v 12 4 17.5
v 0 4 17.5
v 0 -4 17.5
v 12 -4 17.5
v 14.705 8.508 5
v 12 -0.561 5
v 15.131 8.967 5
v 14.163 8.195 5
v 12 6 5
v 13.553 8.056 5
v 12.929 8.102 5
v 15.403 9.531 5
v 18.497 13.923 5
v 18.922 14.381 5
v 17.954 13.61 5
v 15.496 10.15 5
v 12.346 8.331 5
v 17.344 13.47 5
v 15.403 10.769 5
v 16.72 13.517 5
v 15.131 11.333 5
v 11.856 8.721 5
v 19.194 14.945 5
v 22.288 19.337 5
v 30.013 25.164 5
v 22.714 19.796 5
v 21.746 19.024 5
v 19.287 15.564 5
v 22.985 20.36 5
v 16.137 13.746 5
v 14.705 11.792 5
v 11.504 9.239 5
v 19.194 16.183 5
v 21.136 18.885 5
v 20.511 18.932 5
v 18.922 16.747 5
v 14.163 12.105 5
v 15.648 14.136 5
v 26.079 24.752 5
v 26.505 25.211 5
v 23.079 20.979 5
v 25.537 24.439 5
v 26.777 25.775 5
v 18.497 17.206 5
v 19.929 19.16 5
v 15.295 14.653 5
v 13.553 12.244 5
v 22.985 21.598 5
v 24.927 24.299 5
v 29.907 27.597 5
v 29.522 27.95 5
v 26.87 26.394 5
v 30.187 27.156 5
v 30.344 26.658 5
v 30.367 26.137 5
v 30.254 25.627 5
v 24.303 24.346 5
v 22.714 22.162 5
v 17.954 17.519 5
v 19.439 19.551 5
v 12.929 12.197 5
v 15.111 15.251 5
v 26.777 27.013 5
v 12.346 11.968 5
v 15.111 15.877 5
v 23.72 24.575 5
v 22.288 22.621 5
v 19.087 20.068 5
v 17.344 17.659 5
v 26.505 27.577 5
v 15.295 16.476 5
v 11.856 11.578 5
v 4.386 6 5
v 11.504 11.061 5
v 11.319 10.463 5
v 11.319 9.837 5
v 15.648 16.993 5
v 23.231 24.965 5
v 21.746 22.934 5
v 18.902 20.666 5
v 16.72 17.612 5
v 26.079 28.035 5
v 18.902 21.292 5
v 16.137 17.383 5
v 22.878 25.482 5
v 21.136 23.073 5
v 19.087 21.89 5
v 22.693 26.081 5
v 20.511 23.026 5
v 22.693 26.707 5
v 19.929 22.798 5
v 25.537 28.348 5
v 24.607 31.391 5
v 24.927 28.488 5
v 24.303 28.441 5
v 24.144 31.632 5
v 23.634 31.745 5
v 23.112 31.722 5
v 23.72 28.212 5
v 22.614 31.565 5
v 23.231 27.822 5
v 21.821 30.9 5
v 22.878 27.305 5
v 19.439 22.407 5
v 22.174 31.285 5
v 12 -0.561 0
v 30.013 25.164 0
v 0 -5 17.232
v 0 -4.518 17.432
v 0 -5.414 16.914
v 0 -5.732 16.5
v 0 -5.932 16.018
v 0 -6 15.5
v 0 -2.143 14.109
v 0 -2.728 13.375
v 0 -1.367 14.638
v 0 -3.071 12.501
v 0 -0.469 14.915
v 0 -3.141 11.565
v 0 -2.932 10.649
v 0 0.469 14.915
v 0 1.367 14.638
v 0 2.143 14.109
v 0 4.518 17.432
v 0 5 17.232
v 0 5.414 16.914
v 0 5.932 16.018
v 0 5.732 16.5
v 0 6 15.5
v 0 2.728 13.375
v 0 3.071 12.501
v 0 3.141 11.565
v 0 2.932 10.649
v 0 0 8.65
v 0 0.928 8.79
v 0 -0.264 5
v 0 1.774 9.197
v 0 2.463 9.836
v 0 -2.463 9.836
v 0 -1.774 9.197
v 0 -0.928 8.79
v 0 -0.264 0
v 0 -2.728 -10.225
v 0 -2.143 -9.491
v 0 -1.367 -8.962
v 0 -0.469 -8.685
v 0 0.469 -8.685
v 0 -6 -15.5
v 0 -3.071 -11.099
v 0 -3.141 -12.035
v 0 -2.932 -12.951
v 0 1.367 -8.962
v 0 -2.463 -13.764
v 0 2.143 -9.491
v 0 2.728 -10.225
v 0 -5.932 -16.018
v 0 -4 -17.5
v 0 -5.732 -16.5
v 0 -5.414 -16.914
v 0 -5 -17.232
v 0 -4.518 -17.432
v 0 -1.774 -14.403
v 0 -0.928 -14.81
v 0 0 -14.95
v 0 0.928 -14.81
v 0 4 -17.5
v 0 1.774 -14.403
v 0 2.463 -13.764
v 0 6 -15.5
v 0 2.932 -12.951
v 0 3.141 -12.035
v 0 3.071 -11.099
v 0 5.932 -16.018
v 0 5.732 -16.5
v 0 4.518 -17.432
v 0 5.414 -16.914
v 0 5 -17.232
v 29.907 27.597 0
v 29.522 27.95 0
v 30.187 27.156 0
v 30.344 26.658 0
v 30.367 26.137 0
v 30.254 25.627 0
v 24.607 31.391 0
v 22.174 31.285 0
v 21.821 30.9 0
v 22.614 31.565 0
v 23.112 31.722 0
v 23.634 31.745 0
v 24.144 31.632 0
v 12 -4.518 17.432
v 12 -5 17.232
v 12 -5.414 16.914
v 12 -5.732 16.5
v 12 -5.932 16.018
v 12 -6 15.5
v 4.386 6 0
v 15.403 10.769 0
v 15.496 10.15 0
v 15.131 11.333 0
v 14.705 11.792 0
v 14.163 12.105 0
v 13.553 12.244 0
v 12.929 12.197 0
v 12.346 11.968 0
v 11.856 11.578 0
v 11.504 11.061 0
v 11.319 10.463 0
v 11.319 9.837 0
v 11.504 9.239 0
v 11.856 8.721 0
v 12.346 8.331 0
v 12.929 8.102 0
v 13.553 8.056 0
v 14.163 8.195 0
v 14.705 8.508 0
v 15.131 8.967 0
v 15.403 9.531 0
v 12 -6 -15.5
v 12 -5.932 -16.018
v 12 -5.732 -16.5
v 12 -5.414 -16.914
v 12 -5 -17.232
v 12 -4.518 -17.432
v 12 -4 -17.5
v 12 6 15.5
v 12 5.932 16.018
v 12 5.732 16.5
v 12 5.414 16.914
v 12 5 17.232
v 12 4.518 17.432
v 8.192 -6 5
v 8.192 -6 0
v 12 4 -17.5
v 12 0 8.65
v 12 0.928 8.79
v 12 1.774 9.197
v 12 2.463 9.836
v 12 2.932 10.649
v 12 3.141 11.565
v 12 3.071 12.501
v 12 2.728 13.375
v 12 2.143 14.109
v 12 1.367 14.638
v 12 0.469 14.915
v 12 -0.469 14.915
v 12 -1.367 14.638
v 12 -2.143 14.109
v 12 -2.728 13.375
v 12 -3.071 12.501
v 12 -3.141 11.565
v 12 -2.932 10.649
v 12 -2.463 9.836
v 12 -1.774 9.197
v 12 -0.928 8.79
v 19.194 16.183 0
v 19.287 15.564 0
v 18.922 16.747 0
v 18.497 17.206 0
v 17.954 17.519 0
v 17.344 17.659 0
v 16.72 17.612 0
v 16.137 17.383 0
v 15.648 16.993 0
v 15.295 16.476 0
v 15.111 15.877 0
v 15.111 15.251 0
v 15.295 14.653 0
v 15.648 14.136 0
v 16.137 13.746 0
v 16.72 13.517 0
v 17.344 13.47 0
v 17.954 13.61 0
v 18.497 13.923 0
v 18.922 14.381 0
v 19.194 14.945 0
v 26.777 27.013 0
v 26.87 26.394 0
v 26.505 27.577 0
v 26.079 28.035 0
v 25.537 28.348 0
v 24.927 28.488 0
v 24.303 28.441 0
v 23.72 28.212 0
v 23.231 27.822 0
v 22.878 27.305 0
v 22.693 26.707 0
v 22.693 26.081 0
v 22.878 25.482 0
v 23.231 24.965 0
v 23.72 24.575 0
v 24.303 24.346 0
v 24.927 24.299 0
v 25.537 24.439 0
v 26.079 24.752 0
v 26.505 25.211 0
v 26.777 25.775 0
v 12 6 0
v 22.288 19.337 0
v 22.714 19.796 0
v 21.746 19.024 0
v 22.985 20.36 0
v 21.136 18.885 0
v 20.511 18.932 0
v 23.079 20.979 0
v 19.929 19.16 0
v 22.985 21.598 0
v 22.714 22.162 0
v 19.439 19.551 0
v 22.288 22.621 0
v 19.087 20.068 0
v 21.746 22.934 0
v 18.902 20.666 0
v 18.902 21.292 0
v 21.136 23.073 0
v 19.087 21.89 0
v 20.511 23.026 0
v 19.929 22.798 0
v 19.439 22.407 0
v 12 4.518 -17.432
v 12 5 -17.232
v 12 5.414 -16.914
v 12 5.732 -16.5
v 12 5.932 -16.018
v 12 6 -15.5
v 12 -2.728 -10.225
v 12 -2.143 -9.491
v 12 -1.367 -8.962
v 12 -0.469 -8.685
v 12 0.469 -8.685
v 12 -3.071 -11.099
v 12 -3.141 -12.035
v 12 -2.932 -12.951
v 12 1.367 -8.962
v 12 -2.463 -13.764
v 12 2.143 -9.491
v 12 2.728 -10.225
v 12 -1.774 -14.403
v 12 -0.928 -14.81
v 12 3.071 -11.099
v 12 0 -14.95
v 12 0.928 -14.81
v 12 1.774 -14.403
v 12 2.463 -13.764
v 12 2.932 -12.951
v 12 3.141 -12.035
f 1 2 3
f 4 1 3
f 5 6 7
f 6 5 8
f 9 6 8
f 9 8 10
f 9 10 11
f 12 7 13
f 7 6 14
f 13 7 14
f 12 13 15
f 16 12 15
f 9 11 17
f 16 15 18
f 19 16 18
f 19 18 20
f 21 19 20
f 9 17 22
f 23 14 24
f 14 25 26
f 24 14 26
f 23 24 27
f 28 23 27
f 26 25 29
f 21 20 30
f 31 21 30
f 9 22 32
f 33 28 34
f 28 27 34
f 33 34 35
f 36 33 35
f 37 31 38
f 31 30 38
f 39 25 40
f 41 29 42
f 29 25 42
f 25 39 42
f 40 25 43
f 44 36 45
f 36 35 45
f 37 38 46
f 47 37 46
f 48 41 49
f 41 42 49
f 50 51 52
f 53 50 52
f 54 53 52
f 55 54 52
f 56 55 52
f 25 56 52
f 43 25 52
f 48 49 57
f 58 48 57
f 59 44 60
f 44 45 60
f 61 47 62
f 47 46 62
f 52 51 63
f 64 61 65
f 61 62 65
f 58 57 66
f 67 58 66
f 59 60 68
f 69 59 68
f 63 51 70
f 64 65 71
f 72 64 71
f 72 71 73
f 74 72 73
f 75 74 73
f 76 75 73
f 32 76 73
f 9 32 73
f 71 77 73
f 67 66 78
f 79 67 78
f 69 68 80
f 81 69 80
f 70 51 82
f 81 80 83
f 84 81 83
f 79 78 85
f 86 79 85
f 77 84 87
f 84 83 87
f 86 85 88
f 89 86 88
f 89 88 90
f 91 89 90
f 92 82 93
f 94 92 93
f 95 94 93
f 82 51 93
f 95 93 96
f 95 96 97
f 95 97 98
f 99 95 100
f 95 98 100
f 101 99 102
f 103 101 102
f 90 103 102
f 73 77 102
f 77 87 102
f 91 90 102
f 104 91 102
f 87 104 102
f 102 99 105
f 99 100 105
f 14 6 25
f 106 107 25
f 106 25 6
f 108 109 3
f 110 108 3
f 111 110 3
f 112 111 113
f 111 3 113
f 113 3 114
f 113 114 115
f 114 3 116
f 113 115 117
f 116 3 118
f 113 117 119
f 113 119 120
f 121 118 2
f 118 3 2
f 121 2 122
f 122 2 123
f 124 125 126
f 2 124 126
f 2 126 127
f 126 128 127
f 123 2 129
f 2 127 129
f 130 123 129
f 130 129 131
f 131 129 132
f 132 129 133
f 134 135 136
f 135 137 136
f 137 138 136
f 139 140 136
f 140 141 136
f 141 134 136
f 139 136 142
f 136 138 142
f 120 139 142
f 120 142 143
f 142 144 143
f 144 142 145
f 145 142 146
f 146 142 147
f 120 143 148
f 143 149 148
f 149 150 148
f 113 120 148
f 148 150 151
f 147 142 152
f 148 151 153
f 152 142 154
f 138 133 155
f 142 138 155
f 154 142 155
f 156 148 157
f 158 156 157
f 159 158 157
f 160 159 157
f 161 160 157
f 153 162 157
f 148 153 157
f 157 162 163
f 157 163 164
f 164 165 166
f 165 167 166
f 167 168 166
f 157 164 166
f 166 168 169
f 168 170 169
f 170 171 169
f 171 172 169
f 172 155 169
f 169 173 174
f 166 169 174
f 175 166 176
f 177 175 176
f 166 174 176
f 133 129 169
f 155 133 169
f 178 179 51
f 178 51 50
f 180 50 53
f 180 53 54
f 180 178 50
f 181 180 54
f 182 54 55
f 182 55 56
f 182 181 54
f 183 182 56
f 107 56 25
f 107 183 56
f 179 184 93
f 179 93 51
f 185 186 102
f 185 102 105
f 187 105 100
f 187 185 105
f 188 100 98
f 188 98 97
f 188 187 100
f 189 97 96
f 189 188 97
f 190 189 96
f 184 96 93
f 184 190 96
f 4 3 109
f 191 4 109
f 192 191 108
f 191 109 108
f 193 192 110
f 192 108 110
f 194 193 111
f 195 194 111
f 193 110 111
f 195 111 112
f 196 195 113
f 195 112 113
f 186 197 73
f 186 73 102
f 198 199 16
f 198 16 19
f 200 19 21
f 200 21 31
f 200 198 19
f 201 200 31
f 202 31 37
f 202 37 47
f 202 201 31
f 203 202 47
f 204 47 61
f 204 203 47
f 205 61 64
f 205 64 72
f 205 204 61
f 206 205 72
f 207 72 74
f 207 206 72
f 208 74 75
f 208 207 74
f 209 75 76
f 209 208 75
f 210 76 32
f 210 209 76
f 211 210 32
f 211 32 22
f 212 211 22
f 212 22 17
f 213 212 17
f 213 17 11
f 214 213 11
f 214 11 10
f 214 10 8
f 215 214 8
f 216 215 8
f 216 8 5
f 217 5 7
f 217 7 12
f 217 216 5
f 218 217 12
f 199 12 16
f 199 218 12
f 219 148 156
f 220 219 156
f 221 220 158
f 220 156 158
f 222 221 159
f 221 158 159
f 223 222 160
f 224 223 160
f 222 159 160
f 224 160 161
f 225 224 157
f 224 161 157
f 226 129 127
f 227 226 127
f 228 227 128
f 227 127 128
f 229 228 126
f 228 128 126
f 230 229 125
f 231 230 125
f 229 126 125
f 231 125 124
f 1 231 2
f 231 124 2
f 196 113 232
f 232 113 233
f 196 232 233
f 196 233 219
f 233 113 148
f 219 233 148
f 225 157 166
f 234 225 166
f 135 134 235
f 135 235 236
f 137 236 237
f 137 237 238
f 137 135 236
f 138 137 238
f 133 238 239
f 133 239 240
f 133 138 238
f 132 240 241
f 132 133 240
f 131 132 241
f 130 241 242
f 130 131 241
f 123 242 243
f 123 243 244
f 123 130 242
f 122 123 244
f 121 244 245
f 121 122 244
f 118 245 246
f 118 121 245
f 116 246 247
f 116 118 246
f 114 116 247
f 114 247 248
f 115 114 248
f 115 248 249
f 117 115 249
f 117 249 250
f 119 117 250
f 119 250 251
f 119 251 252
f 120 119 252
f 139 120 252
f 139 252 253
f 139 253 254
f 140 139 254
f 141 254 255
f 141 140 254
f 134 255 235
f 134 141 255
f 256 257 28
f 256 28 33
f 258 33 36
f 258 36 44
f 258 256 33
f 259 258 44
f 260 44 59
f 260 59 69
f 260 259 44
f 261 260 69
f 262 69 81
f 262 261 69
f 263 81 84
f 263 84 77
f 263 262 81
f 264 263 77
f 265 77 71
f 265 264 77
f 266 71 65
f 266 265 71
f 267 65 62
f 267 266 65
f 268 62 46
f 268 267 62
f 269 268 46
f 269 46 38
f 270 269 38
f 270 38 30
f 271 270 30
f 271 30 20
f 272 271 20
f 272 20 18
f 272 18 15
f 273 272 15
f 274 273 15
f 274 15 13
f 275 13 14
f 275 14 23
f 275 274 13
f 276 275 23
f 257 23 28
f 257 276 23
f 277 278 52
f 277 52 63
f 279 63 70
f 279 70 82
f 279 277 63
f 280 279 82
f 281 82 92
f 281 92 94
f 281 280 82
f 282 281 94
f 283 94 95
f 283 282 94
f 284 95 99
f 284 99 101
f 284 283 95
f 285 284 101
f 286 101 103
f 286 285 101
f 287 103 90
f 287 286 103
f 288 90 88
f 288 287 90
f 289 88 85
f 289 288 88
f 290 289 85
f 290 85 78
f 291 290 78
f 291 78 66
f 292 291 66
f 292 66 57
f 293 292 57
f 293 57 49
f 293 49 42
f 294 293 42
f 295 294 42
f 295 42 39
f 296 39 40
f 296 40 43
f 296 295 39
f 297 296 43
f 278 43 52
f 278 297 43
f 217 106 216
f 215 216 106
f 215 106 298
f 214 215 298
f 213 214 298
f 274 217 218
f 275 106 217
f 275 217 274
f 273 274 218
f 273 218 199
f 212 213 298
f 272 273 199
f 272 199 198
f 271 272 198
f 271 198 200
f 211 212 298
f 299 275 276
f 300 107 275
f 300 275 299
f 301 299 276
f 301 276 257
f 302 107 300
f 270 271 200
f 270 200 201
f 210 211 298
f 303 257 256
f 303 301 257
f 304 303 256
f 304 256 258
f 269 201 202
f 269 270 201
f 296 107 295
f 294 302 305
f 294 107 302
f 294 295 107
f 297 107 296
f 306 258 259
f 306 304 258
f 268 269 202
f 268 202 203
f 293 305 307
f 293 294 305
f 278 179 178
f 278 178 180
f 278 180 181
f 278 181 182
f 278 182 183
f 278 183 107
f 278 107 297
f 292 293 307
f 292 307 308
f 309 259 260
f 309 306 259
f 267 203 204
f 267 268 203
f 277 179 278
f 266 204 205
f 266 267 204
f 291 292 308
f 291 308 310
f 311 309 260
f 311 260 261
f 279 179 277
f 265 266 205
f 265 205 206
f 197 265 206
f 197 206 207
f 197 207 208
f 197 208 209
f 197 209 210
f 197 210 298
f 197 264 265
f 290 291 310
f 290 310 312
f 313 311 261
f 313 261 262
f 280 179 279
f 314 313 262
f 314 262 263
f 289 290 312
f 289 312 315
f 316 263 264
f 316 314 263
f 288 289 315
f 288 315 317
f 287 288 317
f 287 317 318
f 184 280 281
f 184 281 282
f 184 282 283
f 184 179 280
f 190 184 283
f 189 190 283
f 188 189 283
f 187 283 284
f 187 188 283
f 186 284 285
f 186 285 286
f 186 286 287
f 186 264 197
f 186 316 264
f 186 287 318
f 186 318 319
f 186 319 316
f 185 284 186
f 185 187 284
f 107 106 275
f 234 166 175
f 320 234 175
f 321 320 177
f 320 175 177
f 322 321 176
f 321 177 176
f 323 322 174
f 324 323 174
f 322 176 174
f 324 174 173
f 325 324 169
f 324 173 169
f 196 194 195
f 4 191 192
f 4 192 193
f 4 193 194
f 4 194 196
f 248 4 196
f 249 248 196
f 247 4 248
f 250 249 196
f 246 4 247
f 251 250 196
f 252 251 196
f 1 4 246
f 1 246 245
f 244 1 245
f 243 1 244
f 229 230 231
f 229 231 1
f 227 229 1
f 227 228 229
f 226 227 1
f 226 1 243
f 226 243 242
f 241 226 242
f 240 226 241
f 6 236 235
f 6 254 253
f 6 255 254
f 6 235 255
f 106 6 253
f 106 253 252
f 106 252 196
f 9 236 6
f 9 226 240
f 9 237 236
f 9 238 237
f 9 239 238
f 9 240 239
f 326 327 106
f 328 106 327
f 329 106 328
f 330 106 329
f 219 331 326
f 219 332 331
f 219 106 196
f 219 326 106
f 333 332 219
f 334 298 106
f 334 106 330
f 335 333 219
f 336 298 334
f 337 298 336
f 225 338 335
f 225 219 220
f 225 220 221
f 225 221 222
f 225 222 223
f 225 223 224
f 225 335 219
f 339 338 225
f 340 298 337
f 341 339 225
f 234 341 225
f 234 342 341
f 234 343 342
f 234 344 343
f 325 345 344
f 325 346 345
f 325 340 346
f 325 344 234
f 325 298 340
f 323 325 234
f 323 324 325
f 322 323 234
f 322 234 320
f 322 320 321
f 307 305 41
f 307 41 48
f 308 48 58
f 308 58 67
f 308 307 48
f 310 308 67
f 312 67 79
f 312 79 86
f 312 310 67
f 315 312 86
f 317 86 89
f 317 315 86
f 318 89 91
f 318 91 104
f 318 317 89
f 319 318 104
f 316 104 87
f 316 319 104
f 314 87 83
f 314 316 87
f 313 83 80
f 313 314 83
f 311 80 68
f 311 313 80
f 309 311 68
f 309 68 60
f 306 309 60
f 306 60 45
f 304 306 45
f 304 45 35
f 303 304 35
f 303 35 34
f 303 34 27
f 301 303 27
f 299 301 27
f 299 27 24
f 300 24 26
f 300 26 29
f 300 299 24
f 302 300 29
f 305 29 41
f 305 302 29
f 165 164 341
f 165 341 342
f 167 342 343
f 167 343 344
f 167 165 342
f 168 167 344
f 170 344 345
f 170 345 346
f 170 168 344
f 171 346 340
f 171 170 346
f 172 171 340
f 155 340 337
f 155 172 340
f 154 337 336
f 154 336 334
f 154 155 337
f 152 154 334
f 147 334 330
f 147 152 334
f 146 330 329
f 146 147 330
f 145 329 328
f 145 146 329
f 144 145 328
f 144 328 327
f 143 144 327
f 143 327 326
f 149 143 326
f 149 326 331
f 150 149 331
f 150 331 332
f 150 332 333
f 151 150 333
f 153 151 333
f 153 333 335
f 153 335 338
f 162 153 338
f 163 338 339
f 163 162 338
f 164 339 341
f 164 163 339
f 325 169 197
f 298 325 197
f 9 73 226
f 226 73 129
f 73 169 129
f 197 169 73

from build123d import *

# Parameters (mm, degrees)
SKETCH1_R           = 3.15
BOSS_EXTRUDE1_DEPTH = 12
SKETCH2_R           = 2.1
BOSS_EXTRUDE2_DEPTH = 5


with BuildPart() as part:
    # Sketch1 → Boss-Extrude1 (new body)
    with BuildSketch(Plane(origin=(0, 0, 0), x_dir=(0, 0, -1), z_dir=(1, 0, 0))):
        with BuildLine():
            Line((-15.5, -6), (15.5, -6))
            ThreePointArc((15.5, -6), (16.914213562, -5.414213562), (17.5, -4))
            Line((17.5, -4), (17.5, 4))
            ThreePointArc((17.5, 4), (16.914213562, 5.414213562), (15.5, 6))
            Line((15.5, 6), (-15.5, 6))
            ThreePointArc((-15.5, 6), (-16.914213562, 5.414213562), (-17.5, 4))
            Line((-17.5, 4), (-17.5, -4))
            ThreePointArc((-17.5, -4), (-16.914213562, -5.414213562), (-15.5, -6))
        make_face()
        with Locations((-11.8, 0)):
            Circle(SKETCH1_R, mode=Mode.SUBTRACT)
        with Locations((11.8, 0)):
            Circle(SKETCH1_R, mode=Mode.SUBTRACT)
    extrude(amount=BOSS_EXTRUDE1_DEPTH)

    # Sketch2 → Boss-Extrude2 (add)
    with BuildSketch(Plane.XY):
        with BuildLine():
            Line((30.012822222, 25.164048641), (8.191520443, -6))
            Line((8.191520443, -6), (0, -0.264235636))
            Line((0, -0.264235636), (21.82130178, 30.899813004))
            ThreePointArc((21.82130178, 30.899813004), (23.112309513, 31.722275638), (24.606758741, 31.39096422))
            Line((24.606758741, 31.39096422), (29.521671007, 27.949505602))
            ThreePointArc((29.521671007, 27.949505602), (30.34413364, 26.658497869), (30.012822222, 25.164048641))
        make_face()
        with Locations((24.769909128, 26.393626734)):
            Circle(SKETCH2_R, mode=Mode.SUBTRACT)
        with Locations((20.978568884, 20.979031721)):
            Circle(SKETCH2_R, mode=Mode.SUBTRACT)
        with Locations((17.18722864, 15.564436709)):
            Circle(SKETCH2_R, mode=Mode.SUBTRACT)
        with Locations((13.395888395, 10.149841696)):
            Circle(SKETCH2_R, mode=Mode.SUBTRACT)
    extrude(amount=BOSS_EXTRUDE2_DEPTH)


solid = part.part
